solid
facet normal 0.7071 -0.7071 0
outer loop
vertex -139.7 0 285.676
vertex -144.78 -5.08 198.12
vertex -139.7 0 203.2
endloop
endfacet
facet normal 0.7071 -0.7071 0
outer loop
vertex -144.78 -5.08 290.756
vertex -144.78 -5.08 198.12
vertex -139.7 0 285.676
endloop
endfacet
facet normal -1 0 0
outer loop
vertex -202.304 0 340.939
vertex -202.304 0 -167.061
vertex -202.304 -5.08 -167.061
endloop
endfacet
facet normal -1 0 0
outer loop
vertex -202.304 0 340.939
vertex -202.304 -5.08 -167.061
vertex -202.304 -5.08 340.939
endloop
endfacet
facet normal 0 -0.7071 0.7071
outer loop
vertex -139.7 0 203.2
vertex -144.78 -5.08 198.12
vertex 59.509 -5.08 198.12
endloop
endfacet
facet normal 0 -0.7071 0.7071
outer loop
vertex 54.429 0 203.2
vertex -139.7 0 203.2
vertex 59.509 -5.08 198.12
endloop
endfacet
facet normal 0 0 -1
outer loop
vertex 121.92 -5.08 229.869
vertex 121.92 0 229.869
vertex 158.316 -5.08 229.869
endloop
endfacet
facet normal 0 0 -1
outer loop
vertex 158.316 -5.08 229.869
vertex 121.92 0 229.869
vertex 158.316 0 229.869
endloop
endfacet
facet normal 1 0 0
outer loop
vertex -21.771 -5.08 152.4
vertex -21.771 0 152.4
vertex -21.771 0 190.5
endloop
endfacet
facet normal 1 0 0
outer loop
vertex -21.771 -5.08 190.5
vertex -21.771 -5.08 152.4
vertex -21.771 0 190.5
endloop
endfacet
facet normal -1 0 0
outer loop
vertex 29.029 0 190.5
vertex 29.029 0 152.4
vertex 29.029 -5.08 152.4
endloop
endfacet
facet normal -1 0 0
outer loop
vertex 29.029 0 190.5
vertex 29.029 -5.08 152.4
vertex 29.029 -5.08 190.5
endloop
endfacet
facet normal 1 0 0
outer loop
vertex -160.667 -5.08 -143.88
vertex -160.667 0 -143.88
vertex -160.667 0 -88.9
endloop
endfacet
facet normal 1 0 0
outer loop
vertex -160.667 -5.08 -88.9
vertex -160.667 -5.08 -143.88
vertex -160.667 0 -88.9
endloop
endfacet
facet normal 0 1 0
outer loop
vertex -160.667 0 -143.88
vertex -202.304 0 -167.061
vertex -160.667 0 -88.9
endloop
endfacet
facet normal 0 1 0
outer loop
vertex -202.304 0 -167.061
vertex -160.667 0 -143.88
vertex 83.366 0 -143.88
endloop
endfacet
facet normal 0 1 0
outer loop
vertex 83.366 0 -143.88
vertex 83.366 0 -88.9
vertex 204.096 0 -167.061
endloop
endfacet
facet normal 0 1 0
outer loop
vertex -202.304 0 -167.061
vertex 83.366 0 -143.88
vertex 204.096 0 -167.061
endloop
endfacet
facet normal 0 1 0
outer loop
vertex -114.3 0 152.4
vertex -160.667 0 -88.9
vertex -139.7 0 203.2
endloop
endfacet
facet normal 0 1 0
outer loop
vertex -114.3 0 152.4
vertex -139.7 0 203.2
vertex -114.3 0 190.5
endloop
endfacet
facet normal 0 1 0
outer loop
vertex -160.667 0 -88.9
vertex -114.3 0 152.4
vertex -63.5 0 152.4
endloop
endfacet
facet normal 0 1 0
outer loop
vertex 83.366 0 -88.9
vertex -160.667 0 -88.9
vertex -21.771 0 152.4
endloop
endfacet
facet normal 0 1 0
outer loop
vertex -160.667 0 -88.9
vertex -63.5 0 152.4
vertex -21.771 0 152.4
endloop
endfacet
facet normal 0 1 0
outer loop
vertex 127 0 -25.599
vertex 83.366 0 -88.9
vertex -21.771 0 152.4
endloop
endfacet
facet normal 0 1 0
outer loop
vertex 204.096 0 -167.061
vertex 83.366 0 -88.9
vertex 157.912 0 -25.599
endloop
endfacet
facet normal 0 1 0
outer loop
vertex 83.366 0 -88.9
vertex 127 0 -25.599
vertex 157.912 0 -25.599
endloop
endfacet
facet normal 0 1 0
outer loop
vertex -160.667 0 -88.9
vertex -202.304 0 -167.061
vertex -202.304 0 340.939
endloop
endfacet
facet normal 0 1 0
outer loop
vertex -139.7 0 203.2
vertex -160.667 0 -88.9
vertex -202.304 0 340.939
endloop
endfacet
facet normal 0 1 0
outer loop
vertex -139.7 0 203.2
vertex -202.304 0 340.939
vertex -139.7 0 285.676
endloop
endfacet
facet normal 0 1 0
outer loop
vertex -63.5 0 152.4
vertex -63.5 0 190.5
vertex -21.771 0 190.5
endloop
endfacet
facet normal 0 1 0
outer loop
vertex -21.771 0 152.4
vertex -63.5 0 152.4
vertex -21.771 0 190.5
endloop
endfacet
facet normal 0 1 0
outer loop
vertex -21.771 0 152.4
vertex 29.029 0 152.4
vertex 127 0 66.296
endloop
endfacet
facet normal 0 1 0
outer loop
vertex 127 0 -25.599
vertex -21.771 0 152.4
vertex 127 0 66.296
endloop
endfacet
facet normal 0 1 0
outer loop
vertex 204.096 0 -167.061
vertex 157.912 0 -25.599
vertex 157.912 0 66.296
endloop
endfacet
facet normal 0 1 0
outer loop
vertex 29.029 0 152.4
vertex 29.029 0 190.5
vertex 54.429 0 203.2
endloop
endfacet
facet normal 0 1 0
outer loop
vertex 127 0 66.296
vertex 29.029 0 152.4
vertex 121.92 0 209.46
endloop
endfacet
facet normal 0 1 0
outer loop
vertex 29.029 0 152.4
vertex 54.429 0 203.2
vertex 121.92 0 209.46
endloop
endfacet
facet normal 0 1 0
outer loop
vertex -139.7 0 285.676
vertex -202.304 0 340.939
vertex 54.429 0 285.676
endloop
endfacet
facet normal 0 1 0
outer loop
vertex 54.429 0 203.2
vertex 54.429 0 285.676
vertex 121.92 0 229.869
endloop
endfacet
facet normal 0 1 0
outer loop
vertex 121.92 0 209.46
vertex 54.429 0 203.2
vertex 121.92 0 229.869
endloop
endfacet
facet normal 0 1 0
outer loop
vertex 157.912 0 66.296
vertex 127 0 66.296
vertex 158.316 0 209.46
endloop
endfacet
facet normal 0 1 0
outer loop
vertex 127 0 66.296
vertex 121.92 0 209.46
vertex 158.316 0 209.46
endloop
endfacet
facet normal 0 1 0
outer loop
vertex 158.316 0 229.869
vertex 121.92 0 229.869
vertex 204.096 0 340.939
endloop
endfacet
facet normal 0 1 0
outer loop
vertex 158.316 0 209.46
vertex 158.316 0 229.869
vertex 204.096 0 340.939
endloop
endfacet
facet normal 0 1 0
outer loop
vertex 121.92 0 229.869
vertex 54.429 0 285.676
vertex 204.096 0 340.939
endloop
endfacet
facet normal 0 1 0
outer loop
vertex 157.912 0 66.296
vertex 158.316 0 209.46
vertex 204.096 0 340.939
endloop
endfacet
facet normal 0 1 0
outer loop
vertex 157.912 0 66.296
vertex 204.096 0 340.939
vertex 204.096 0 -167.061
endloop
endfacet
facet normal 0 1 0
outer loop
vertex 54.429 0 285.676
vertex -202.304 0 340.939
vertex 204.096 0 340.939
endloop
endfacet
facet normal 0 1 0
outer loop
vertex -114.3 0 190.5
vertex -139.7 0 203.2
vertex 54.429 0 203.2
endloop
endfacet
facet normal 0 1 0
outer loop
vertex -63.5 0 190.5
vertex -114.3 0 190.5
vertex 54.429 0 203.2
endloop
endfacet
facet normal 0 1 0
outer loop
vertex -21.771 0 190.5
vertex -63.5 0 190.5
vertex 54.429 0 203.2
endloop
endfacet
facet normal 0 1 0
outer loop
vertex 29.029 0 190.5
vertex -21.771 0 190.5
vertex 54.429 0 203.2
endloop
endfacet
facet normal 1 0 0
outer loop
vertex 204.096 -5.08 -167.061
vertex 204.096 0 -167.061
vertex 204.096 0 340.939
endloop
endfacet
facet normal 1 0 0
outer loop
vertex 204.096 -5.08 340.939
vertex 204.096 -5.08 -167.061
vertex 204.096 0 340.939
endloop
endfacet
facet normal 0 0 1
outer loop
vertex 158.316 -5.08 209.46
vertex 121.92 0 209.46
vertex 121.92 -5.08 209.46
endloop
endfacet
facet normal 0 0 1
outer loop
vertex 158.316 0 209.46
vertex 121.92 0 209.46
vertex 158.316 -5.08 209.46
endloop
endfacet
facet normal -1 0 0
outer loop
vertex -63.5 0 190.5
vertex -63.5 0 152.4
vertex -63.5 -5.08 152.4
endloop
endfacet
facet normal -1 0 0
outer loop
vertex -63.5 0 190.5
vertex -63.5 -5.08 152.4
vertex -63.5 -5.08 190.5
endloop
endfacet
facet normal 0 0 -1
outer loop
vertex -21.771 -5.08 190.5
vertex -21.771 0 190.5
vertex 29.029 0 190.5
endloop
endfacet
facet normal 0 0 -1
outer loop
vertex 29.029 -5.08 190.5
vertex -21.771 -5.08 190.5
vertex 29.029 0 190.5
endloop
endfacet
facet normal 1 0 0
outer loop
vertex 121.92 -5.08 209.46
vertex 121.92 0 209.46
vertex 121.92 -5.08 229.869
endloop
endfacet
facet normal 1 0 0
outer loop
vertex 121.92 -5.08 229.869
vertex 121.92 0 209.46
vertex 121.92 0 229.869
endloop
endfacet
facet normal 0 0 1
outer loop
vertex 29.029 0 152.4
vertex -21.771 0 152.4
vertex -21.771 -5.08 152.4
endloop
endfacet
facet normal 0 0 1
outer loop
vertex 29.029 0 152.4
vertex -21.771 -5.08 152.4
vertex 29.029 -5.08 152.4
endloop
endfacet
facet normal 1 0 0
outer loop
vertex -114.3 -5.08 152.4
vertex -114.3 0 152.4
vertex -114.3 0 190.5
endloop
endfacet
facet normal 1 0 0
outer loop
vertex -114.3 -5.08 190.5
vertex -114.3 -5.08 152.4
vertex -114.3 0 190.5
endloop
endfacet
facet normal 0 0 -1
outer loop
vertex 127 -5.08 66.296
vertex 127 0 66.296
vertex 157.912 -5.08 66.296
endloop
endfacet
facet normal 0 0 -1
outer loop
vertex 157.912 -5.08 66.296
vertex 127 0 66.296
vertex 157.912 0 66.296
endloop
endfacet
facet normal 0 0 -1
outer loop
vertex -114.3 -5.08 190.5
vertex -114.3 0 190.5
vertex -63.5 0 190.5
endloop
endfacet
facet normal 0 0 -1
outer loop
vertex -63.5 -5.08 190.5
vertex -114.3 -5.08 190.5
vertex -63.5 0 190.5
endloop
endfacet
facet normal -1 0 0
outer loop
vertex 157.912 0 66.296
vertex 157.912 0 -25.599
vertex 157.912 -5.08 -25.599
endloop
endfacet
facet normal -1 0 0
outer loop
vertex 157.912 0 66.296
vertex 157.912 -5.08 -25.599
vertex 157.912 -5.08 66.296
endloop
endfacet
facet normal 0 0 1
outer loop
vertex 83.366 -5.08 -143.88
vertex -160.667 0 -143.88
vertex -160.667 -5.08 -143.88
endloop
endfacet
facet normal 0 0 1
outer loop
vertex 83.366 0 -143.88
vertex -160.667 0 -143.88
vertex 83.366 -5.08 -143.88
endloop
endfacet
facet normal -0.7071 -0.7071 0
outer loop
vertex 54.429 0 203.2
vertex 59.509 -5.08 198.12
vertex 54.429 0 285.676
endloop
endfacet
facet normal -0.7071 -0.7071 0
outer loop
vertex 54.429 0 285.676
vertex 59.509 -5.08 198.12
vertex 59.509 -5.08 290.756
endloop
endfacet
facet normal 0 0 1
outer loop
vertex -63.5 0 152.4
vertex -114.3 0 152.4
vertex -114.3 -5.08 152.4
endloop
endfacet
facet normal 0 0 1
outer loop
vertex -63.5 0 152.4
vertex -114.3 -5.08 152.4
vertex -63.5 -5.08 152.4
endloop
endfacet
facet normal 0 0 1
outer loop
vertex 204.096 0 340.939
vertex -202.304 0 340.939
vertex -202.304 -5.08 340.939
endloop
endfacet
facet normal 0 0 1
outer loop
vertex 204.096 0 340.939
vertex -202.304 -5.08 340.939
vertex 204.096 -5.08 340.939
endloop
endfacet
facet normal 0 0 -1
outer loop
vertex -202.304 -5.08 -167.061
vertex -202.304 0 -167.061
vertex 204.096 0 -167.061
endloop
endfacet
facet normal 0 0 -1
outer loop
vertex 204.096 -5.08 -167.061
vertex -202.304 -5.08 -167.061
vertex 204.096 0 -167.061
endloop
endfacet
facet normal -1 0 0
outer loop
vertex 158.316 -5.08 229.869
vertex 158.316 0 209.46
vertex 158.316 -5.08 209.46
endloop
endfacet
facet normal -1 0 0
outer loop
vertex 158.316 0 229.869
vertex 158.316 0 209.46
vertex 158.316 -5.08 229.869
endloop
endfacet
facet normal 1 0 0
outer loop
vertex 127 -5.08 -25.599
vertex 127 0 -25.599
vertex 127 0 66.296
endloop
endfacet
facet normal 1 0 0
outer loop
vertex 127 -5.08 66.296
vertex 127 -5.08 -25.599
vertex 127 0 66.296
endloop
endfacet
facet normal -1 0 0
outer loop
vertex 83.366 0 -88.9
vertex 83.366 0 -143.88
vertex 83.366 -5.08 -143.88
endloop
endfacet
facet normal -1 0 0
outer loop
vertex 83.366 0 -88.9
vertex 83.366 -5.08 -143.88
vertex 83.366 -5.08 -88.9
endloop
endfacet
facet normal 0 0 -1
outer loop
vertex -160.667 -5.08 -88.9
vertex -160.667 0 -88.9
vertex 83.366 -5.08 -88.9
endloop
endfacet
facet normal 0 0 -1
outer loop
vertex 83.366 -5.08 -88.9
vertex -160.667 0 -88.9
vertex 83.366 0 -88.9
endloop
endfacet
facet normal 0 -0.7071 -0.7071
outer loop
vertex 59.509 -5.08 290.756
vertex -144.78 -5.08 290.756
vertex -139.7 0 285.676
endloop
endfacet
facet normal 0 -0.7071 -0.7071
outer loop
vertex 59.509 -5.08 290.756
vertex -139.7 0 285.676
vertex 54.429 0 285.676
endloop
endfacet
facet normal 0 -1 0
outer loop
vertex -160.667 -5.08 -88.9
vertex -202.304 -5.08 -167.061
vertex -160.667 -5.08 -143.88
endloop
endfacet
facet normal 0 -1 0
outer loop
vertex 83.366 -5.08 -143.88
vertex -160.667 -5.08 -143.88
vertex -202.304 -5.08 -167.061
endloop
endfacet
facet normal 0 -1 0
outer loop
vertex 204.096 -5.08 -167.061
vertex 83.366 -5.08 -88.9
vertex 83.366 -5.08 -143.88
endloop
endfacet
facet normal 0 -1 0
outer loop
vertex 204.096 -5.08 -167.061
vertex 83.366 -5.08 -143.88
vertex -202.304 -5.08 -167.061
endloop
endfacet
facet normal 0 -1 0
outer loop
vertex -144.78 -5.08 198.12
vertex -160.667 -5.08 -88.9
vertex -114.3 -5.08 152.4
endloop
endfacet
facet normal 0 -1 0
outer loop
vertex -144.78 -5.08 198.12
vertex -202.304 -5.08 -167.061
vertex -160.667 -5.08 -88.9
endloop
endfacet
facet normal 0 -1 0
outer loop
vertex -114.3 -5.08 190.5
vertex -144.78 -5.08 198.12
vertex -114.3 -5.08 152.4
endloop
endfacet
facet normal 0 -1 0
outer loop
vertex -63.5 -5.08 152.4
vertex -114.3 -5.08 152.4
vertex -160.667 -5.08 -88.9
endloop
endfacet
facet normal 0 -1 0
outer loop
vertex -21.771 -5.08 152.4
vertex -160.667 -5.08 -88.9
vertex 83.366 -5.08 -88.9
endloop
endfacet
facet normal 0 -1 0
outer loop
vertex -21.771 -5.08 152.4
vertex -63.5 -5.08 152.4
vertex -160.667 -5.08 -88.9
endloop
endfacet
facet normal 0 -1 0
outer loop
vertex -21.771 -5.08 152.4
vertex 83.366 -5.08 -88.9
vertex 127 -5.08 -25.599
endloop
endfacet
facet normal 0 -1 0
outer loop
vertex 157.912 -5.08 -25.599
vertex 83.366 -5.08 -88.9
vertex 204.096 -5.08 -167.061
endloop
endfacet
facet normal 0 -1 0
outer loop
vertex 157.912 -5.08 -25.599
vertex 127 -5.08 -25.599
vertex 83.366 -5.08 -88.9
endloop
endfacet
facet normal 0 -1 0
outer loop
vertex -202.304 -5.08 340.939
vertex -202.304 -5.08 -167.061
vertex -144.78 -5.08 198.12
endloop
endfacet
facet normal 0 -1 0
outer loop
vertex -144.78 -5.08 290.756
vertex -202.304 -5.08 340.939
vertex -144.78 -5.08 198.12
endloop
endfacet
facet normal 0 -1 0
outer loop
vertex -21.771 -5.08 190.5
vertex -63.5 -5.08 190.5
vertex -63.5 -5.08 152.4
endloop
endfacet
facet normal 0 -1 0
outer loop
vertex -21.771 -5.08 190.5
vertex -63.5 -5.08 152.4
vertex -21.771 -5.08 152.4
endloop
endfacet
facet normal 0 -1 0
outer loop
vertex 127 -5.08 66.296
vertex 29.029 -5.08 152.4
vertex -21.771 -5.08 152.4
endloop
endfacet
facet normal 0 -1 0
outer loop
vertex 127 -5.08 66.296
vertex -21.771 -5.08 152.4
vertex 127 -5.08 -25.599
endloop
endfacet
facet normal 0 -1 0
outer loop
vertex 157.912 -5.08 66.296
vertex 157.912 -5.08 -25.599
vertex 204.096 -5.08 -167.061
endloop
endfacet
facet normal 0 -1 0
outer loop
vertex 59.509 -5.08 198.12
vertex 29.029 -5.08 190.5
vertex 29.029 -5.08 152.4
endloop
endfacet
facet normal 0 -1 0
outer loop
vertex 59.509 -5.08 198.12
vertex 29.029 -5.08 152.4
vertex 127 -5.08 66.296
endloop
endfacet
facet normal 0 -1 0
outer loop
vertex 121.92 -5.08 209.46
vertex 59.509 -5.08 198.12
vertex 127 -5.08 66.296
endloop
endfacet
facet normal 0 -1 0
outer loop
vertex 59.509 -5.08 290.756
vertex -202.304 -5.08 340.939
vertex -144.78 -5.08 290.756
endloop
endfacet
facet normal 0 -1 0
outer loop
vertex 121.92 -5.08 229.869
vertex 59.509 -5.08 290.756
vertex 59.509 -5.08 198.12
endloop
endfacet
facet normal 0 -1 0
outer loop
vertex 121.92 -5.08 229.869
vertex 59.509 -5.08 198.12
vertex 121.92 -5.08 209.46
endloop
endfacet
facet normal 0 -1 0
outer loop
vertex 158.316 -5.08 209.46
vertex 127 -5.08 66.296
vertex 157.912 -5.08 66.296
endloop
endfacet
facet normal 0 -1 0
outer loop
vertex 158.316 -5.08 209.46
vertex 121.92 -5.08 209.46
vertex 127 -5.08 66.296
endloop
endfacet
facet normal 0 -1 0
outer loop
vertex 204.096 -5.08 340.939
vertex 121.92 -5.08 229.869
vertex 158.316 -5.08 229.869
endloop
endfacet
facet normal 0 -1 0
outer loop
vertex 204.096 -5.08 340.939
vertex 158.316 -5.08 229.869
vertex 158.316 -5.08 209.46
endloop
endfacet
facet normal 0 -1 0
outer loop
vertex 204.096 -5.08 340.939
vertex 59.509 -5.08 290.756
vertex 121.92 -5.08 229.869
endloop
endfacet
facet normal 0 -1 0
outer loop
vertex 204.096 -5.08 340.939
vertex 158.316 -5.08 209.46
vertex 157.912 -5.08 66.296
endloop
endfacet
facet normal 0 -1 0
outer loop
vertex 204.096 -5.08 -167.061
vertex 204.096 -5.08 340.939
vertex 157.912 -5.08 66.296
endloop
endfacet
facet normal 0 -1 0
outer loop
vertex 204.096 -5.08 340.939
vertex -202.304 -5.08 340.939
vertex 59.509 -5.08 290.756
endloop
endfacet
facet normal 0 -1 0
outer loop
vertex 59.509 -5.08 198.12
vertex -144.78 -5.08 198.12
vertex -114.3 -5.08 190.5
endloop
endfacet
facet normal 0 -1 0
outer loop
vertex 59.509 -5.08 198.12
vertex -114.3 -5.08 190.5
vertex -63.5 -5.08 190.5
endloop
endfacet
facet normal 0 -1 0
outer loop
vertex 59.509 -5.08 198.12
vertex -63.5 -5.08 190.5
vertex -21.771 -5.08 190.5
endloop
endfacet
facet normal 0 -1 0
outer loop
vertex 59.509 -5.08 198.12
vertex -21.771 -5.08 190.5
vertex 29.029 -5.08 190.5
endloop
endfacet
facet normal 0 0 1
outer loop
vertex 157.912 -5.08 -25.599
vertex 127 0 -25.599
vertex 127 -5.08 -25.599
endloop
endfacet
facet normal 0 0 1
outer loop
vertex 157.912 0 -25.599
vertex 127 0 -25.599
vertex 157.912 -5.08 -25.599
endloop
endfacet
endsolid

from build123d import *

# Parameters (mm, degrees)
F0_W     = 406.4
F0_H     = 508
F0_W_2   = 244.0329119563
F0_H_2   = 54.9797415733
F0_W_3   = 30.9118032455
F0_H_3   = 91.8955244124
F0_W_4   = 50.8
F0_H_4   = 38.1
F0_W_5   = 194.1293792814
F0_H_5   = 82.4762731791
F0_W_6   = 36.3956689835
F0_H_6   = 20.4090550542
F1_DEPTH = 5.08
F2_SIZE  = 5.07999


# Not quite as in the source:
# - a fillet or chamfer is up to 0.001 mm smaller than in the source, because OpenCascade refuses the exact size


with BuildPart() as f1:
    # F0 (on Front) → F1 (new body)
    with BuildSketch(Plane.XZ):
        with Locations((0.8964706212, 86.9385877169)):
            Rectangle(F0_W, F0_H)
        with Locations((-38.650367409, -116.3898707867)):
            Rectangle(F0_W_2, F0_H_2, mode=Mode.SUBTRACT)
        with Locations((142.4559016228, 20.3487034887)):
            Rectangle(F0_W_3, F0_H_3, mode=Mode.SUBTRACT)
        with Locations((-88.9, 171.45)):
            Rectangle(F0_W_4, F0_H_4, mode=Mode.SUBTRACT)
        with Locations((-42.6353103593, 244.4381365895)):
            Rectangle(F0_W_5, F0_H_5, mode=Mode.SUBTRACT)
        with Locations((3.6293792814, 171.45)):
            Rectangle(F0_W_4, F0_H_4, mode=Mode.SUBTRACT)
        with Locations((140.1178344917, 219.6642868221)):
            Rectangle(F0_W_6, F0_H_6, mode=Mode.SUBTRACT)
    extrude(amount=F1_DEPTH)

    # F2 (size 5.08 in the source; OpenCascade refuses exactly that, so slightly less here)
    f2_edges = [f1.edges().sort_by_distance(p)[0] for p in [
        (-139.7, -5.08, 244.438137),
        (-42.63531, -5.08, 285.676273),
        (54.429379, -5.08, 244.438137),
        (-42.63531, -5.08, 203.2),
    ]]
    chamfer(f2_edges, length=F2_SIZE)


solid = f1.part
